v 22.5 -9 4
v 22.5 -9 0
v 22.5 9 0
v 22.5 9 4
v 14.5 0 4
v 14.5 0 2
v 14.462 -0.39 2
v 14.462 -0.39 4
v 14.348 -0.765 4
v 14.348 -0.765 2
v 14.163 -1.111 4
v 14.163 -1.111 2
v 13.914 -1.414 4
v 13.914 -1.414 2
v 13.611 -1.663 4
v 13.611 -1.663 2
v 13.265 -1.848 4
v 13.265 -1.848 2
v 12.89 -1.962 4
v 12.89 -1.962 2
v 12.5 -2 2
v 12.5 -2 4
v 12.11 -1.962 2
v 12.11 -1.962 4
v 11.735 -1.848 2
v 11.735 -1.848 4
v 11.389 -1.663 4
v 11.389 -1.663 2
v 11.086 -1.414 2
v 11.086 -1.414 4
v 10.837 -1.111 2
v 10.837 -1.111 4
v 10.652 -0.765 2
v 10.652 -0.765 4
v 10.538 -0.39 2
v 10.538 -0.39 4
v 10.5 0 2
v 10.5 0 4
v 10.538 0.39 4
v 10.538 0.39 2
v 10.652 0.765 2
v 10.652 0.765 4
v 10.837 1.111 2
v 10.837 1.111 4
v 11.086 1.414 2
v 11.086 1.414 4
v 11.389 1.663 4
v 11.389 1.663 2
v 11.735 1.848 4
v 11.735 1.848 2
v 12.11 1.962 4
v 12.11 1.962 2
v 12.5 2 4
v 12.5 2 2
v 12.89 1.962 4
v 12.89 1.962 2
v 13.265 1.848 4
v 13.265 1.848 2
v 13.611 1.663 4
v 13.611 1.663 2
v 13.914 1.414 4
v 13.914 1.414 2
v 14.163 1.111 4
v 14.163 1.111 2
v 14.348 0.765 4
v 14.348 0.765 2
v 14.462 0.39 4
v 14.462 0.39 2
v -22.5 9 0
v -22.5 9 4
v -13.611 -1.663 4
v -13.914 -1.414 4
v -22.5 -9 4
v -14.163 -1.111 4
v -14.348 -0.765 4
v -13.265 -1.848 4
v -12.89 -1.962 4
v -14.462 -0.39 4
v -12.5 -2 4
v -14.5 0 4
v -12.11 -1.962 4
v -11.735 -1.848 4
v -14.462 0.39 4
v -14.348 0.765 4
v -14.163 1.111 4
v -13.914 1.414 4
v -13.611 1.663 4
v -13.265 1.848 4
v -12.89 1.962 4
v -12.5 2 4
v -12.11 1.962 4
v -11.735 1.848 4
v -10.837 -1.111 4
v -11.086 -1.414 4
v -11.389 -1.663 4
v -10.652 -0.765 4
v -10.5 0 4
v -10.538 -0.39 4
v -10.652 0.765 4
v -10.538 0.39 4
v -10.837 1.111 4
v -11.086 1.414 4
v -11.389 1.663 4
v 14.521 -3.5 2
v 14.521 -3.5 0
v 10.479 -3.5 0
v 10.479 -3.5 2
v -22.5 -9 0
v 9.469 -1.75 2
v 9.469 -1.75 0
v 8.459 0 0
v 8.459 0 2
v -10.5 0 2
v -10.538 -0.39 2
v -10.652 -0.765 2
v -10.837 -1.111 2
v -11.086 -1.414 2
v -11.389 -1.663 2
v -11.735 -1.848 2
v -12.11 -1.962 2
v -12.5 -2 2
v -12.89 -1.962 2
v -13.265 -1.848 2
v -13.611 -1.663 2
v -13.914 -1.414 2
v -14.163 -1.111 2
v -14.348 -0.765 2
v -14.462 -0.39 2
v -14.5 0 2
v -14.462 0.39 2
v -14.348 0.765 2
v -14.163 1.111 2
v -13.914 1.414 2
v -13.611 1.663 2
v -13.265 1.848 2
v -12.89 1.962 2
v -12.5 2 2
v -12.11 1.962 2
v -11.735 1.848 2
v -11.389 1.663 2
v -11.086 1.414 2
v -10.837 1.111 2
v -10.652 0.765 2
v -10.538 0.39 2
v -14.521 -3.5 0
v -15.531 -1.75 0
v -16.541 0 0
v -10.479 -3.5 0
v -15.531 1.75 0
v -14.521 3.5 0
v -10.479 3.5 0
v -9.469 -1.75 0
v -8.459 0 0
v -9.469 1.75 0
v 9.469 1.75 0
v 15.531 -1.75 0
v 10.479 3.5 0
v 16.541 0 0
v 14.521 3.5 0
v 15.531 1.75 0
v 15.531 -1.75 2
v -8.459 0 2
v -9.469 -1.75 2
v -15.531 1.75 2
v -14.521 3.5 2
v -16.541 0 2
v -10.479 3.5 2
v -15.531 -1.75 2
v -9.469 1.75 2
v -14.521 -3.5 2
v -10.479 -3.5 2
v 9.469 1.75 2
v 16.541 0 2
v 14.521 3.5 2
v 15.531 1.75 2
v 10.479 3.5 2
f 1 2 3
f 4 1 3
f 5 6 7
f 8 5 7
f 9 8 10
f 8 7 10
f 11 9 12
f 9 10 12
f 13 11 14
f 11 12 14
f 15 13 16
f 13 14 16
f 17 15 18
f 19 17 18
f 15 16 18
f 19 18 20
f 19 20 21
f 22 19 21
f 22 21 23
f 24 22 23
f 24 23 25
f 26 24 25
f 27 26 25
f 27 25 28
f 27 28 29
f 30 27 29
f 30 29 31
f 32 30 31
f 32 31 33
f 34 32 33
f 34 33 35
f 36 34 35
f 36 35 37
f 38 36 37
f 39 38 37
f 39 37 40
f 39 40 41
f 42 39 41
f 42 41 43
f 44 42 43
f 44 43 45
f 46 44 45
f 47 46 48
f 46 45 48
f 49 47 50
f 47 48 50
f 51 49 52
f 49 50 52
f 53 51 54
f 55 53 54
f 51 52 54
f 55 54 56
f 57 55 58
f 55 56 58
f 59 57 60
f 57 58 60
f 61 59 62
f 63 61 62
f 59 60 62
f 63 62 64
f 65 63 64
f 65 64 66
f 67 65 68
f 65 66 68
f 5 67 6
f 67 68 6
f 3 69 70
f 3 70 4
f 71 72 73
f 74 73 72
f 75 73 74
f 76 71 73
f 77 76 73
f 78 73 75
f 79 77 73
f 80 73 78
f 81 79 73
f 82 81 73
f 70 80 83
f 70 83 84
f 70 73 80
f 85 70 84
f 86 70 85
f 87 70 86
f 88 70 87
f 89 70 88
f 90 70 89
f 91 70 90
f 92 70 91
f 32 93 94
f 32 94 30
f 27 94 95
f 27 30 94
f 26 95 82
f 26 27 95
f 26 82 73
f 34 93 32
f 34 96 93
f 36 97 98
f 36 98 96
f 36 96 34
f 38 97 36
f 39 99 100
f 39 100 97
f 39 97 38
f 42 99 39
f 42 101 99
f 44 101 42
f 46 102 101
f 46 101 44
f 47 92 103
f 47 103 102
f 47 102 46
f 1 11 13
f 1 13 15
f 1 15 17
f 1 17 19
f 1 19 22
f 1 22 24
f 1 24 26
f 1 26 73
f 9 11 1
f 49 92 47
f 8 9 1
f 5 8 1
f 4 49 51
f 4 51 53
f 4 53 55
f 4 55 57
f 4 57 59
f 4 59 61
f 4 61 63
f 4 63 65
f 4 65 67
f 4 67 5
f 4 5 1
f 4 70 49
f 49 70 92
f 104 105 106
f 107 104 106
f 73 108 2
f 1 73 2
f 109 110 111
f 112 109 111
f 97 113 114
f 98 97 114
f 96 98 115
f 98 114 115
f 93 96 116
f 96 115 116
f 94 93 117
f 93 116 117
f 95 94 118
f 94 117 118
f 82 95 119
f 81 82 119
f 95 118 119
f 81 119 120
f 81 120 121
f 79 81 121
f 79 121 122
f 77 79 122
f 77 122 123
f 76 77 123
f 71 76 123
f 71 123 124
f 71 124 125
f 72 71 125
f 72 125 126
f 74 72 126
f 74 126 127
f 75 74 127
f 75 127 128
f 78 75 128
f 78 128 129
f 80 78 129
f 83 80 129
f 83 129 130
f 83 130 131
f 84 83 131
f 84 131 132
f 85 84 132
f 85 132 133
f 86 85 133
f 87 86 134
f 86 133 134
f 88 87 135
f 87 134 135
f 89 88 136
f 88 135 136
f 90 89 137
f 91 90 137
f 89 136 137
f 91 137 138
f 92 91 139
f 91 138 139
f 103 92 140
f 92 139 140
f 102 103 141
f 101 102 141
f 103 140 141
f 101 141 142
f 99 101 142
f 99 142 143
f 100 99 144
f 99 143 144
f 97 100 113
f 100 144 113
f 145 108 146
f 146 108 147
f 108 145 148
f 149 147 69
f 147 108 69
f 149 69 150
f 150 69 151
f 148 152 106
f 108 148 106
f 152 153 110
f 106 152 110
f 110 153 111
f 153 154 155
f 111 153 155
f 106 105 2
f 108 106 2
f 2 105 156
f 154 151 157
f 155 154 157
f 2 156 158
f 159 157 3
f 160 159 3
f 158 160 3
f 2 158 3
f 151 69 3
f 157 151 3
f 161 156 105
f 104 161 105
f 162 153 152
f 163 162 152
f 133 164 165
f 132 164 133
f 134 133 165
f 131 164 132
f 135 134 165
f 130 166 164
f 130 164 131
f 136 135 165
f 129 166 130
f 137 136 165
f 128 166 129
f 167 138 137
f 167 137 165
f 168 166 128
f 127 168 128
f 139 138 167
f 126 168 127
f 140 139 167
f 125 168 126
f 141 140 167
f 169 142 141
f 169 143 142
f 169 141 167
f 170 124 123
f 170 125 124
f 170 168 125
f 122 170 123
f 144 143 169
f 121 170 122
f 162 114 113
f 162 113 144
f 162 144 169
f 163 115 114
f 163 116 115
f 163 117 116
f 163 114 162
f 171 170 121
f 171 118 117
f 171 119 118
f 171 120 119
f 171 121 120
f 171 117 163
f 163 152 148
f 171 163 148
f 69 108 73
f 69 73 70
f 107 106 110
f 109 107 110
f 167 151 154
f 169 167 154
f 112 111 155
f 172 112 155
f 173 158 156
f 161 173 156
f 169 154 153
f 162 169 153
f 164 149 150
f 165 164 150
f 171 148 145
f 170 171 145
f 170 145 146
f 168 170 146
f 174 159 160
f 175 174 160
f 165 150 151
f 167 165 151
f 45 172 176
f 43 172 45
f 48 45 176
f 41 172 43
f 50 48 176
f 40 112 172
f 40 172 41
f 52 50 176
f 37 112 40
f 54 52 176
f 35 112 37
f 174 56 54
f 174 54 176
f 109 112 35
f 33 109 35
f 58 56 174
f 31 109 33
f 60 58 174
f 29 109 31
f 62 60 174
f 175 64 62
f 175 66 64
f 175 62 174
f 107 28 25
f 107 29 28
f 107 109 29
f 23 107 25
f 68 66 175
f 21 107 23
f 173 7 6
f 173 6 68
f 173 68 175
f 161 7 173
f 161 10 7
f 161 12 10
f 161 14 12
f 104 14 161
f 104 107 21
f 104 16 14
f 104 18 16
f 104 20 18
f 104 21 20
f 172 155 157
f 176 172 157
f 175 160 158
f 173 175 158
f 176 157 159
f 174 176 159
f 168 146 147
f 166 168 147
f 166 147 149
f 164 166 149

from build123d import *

# Parameters (mm, degrees)
F0_W     = 45
F0_H     = 18
F1_DEPTH = 4
F3_DEPTH = 2
F4_R     = 2
F5_DEPTH = 25


with BuildPart() as f1:
    # F0 (on Top) → F1 (new body)
    with BuildSketch(Plane.XY):
        Rectangle(F0_W, F0_H)
        Polygon((-12.5, 4.0414518843), (-9, 2.0207259422), (-9, -2.0207259422), (-12.5, -4.0414518843), (-16, -2.0207259422), (-16, 2.0207259422), align=None, mode=Mode.SUBTRACT)
        Polygon((12.5, 4.0414518843), (16, 2.0207259422), (16, -2.0207259422), (12.5, -4.0414518843), (9, -2.0207259422), (9, 2.0207259422), align=None, mode=Mode.SUBTRACT)
        Polygon((-9, -2.0207259422), (-9, 2.0207259422), (-12.5, 4.0414518843), (-16, 2.0207259422), (-16, -2.0207259422), (-12.5, -4.0414518843), align=None)
        Polygon((16, -2.0207259422), (16, 2.0207259422), (12.5, 4.0414518843), (9, 2.0207259422), (9, -2.0207259422), (12.5, -4.0414518843), align=None)
    extrude(amount=F1_DEPTH)

    # F2 (on face) → F3 (cut)
    with BuildSketch(Plane(origin=(0, 0, 0), x_dir=(1, 0, 0), z_dir=(0, 0, -1))):
        with BuildLine():
            ThreePointArc((-9.4689111711, -1.750000146), (-9.1192596298, -0.9058667393), (-9, 0))
            ThreePointArc((-9, 0), (-9.1192596232, 0.9058667146), (-9.4689111455, 1.7500001018))
            ThreePointArc((-9.4689111455, 1.7500001018), (-10.7500000509, 3.0310889426), (-12.5, 3.5))
            ThreePointArc((-12.5, 3.5), (-14.2499999465, 3.0310889441), (-15.5310888515, 1.750000107))
            ThreePointArc((-15.5310888515, 1.750000107), (-16, 1.113e-07), (-15.5310889628, -1.7499999142))
            ThreePointArc((-15.5310889628, -1.7499999142), (-14.2500000429, -3.0310888885), (-12.5, -3.5))
            ThreePointArc((-12.5, -3.5), (-10.750000073, -3.0310889554), (-9.4689111711, -1.750000146))
        make_face()
        with BuildLine():
            ThreePointArc((-15.5310888515, 1.750000107), (-14.2499999465, 3.0310889441), (-12.5, 3.5))
            Line((-12.5, 3.5), (-14.5207259422, 3.5))
            Line((-14.5207259422, 3.5), (-15.5310888515, 1.750000107))
        make_face()
        with BuildLine():
            ThreePointArc((-15.5310889628, -1.7499999142), (-16, 1.113e-07), (-15.5310888515, 1.750000107))
            Line((-15.5310888515, 1.750000107), (-16.5414518843, 0))
            Line((-16.5414518843, 0), (-15.5310889628, -1.7499999142))
        make_face()
        with BuildLine():
            Line((-14.5207259422, -3.5), (-12.5, -3.5))
            ThreePointArc((-12.5, -3.5), (-14.2500000429, -3.0310888885), (-15.5310889628, -1.7499999142))
            Line((-15.5310889628, -1.7499999142), (-14.5207259422, -3.5))
        make_face()
        with BuildLine():
            Line((-10.4792740578, -3.5), (-9.4689111711, -1.750000146))
            ThreePointArc((-9.4689111711, -1.750000146), (-10.750000073, -3.0310889554), (-12.5, -3.5))
            Line((-12.5, -3.5), (-10.4792740578, -3.5))
        make_face()
        with BuildLine():
            ThreePointArc((-9.4689111455, 1.7500001018), (-9.1192596232, 0.9058667146), (-9, 0))
            ThreePointArc((-9, 0), (-9.1192596298, -0.9058667393), (-9.4689111711, -1.750000146))
            Line((-9.4689111711, -1.750000146), (-8.4585481157, 0))
            Line((-8.4585481157, 0), (-9.4689111455, 1.7500001018))
        make_face()
        with BuildLine():
            ThreePointArc((-12.5, 3.5), (-10.7500000509, 3.0310889426), (-9.4689111455, 1.7500001018))
            Line((-9.4689111455, 1.7500001018), (-10.4792740578, 3.5))
            Line((-10.4792740578, 3.5), (-12.5, 3.5))
        make_face()
        with BuildLine():
            ThreePointArc((15.5310888131, -1.7500001734), (15.8807403661, -0.9058667546), (16, 0))
            ThreePointArc((16, 0), (15.8807403727, 0.9058667299), (15.5310888387, 1.7500001291))
            ThreePointArc((15.5310888387, 1.7500001291), (14.2499999354, 3.0310889505), (12.5, 3.5))
            ThreePointArc((12.5, 3.5), (10.7499999929, 3.0310889092), (9.4689110786, 1.7499999859))
            ThreePointArc((9.4689110786, 1.7499999859), (9, -1.92e-08), (9.4689110978, -1.7500000191))
            ThreePointArc((9.4689110978, -1.7500000191), (10.7500000096, -3.0310889188), (12.5, -3.5))
            ThreePointArc((12.5, -3.5), (14.2499999133, -3.0310889633), (15.5310888131, -1.7500001734))
        make_face()
        with BuildLine():
            ThreePointArc((15.5310888387, 1.7500001291), (15.8807403727, 0.9058667299), (16, 0))
            ThreePointArc((16, 0), (15.8807403661, -0.9058667546), (15.5310888131, -1.7500001734))
            Line((15.5310888131, -1.7500001734), (16.5414518843, 0))
            Line((16.5414518843, 0), (15.5310888387, 1.7500001291))
        make_face()
        with BuildLine():
            Line((14.5207259422, -3.5), (15.5310888131, -1.7500001734))
            ThreePointArc((15.5310888131, -1.7500001734), (14.2499999133, -3.0310889633), (12.5, -3.5))
            Line((12.5, -3.5), (14.5207259422, -3.5))
        make_face()
        with BuildLine():
            Line((10.4792740578, -3.5), (12.5, -3.5))
            ThreePointArc((12.5, -3.5), (10.7500000096, -3.0310889188), (9.4689110978, -1.7500000191))
            Line((9.4689110978, -1.7500000191), (10.4792740578, -3.5))
        make_face()
        with BuildLine():
            ThreePointArc((9.4689110978, -1.7500000191), (9, -1.92e-08), (9.4689110786, 1.7499999859))
            Line((9.4689110786, 1.7499999859), (8.4585481157, 0))
            Line((8.4585481157, 0), (9.4689110978, -1.7500000191))
        make_face()
        with BuildLine():
            ThreePointArc((9.4689110786, 1.7499999859), (10.7499999929, 3.0310889092), (12.5, 3.5))
            Line((12.5, 3.5), (10.4792740578, 3.5))
            Line((10.4792740578, 3.5), (9.4689110786, 1.7499999859))
        make_face()
        with BuildLine():
            ThreePointArc((12.5, 3.5), (14.2499999354, 3.0310889505), (15.5310888387, 1.7500001291))
            Line((15.5310888387, 1.7500001291), (14.5207259422, 3.5))
            Line((14.5207259422, 3.5), (12.5, 3.5))
        make_face()
    extrude(amount=-F3_DEPTH, mode=Mode.SUBTRACT)

    # F4 (on face) → F5 (cut)
    with BuildSketch(Plane(origin=(0, 0, 0), x_dir=(1, 0, 0), z_dir=(0, 0, -1))):
        with Locations((-12.5, 0)):
            Circle(F4_R)
        with Locations((12.5, 0)):
            Circle(F4_R)
    extrude(amount=-F5_DEPTH, mode=Mode.SUBTRACT)


solid = f1.part
